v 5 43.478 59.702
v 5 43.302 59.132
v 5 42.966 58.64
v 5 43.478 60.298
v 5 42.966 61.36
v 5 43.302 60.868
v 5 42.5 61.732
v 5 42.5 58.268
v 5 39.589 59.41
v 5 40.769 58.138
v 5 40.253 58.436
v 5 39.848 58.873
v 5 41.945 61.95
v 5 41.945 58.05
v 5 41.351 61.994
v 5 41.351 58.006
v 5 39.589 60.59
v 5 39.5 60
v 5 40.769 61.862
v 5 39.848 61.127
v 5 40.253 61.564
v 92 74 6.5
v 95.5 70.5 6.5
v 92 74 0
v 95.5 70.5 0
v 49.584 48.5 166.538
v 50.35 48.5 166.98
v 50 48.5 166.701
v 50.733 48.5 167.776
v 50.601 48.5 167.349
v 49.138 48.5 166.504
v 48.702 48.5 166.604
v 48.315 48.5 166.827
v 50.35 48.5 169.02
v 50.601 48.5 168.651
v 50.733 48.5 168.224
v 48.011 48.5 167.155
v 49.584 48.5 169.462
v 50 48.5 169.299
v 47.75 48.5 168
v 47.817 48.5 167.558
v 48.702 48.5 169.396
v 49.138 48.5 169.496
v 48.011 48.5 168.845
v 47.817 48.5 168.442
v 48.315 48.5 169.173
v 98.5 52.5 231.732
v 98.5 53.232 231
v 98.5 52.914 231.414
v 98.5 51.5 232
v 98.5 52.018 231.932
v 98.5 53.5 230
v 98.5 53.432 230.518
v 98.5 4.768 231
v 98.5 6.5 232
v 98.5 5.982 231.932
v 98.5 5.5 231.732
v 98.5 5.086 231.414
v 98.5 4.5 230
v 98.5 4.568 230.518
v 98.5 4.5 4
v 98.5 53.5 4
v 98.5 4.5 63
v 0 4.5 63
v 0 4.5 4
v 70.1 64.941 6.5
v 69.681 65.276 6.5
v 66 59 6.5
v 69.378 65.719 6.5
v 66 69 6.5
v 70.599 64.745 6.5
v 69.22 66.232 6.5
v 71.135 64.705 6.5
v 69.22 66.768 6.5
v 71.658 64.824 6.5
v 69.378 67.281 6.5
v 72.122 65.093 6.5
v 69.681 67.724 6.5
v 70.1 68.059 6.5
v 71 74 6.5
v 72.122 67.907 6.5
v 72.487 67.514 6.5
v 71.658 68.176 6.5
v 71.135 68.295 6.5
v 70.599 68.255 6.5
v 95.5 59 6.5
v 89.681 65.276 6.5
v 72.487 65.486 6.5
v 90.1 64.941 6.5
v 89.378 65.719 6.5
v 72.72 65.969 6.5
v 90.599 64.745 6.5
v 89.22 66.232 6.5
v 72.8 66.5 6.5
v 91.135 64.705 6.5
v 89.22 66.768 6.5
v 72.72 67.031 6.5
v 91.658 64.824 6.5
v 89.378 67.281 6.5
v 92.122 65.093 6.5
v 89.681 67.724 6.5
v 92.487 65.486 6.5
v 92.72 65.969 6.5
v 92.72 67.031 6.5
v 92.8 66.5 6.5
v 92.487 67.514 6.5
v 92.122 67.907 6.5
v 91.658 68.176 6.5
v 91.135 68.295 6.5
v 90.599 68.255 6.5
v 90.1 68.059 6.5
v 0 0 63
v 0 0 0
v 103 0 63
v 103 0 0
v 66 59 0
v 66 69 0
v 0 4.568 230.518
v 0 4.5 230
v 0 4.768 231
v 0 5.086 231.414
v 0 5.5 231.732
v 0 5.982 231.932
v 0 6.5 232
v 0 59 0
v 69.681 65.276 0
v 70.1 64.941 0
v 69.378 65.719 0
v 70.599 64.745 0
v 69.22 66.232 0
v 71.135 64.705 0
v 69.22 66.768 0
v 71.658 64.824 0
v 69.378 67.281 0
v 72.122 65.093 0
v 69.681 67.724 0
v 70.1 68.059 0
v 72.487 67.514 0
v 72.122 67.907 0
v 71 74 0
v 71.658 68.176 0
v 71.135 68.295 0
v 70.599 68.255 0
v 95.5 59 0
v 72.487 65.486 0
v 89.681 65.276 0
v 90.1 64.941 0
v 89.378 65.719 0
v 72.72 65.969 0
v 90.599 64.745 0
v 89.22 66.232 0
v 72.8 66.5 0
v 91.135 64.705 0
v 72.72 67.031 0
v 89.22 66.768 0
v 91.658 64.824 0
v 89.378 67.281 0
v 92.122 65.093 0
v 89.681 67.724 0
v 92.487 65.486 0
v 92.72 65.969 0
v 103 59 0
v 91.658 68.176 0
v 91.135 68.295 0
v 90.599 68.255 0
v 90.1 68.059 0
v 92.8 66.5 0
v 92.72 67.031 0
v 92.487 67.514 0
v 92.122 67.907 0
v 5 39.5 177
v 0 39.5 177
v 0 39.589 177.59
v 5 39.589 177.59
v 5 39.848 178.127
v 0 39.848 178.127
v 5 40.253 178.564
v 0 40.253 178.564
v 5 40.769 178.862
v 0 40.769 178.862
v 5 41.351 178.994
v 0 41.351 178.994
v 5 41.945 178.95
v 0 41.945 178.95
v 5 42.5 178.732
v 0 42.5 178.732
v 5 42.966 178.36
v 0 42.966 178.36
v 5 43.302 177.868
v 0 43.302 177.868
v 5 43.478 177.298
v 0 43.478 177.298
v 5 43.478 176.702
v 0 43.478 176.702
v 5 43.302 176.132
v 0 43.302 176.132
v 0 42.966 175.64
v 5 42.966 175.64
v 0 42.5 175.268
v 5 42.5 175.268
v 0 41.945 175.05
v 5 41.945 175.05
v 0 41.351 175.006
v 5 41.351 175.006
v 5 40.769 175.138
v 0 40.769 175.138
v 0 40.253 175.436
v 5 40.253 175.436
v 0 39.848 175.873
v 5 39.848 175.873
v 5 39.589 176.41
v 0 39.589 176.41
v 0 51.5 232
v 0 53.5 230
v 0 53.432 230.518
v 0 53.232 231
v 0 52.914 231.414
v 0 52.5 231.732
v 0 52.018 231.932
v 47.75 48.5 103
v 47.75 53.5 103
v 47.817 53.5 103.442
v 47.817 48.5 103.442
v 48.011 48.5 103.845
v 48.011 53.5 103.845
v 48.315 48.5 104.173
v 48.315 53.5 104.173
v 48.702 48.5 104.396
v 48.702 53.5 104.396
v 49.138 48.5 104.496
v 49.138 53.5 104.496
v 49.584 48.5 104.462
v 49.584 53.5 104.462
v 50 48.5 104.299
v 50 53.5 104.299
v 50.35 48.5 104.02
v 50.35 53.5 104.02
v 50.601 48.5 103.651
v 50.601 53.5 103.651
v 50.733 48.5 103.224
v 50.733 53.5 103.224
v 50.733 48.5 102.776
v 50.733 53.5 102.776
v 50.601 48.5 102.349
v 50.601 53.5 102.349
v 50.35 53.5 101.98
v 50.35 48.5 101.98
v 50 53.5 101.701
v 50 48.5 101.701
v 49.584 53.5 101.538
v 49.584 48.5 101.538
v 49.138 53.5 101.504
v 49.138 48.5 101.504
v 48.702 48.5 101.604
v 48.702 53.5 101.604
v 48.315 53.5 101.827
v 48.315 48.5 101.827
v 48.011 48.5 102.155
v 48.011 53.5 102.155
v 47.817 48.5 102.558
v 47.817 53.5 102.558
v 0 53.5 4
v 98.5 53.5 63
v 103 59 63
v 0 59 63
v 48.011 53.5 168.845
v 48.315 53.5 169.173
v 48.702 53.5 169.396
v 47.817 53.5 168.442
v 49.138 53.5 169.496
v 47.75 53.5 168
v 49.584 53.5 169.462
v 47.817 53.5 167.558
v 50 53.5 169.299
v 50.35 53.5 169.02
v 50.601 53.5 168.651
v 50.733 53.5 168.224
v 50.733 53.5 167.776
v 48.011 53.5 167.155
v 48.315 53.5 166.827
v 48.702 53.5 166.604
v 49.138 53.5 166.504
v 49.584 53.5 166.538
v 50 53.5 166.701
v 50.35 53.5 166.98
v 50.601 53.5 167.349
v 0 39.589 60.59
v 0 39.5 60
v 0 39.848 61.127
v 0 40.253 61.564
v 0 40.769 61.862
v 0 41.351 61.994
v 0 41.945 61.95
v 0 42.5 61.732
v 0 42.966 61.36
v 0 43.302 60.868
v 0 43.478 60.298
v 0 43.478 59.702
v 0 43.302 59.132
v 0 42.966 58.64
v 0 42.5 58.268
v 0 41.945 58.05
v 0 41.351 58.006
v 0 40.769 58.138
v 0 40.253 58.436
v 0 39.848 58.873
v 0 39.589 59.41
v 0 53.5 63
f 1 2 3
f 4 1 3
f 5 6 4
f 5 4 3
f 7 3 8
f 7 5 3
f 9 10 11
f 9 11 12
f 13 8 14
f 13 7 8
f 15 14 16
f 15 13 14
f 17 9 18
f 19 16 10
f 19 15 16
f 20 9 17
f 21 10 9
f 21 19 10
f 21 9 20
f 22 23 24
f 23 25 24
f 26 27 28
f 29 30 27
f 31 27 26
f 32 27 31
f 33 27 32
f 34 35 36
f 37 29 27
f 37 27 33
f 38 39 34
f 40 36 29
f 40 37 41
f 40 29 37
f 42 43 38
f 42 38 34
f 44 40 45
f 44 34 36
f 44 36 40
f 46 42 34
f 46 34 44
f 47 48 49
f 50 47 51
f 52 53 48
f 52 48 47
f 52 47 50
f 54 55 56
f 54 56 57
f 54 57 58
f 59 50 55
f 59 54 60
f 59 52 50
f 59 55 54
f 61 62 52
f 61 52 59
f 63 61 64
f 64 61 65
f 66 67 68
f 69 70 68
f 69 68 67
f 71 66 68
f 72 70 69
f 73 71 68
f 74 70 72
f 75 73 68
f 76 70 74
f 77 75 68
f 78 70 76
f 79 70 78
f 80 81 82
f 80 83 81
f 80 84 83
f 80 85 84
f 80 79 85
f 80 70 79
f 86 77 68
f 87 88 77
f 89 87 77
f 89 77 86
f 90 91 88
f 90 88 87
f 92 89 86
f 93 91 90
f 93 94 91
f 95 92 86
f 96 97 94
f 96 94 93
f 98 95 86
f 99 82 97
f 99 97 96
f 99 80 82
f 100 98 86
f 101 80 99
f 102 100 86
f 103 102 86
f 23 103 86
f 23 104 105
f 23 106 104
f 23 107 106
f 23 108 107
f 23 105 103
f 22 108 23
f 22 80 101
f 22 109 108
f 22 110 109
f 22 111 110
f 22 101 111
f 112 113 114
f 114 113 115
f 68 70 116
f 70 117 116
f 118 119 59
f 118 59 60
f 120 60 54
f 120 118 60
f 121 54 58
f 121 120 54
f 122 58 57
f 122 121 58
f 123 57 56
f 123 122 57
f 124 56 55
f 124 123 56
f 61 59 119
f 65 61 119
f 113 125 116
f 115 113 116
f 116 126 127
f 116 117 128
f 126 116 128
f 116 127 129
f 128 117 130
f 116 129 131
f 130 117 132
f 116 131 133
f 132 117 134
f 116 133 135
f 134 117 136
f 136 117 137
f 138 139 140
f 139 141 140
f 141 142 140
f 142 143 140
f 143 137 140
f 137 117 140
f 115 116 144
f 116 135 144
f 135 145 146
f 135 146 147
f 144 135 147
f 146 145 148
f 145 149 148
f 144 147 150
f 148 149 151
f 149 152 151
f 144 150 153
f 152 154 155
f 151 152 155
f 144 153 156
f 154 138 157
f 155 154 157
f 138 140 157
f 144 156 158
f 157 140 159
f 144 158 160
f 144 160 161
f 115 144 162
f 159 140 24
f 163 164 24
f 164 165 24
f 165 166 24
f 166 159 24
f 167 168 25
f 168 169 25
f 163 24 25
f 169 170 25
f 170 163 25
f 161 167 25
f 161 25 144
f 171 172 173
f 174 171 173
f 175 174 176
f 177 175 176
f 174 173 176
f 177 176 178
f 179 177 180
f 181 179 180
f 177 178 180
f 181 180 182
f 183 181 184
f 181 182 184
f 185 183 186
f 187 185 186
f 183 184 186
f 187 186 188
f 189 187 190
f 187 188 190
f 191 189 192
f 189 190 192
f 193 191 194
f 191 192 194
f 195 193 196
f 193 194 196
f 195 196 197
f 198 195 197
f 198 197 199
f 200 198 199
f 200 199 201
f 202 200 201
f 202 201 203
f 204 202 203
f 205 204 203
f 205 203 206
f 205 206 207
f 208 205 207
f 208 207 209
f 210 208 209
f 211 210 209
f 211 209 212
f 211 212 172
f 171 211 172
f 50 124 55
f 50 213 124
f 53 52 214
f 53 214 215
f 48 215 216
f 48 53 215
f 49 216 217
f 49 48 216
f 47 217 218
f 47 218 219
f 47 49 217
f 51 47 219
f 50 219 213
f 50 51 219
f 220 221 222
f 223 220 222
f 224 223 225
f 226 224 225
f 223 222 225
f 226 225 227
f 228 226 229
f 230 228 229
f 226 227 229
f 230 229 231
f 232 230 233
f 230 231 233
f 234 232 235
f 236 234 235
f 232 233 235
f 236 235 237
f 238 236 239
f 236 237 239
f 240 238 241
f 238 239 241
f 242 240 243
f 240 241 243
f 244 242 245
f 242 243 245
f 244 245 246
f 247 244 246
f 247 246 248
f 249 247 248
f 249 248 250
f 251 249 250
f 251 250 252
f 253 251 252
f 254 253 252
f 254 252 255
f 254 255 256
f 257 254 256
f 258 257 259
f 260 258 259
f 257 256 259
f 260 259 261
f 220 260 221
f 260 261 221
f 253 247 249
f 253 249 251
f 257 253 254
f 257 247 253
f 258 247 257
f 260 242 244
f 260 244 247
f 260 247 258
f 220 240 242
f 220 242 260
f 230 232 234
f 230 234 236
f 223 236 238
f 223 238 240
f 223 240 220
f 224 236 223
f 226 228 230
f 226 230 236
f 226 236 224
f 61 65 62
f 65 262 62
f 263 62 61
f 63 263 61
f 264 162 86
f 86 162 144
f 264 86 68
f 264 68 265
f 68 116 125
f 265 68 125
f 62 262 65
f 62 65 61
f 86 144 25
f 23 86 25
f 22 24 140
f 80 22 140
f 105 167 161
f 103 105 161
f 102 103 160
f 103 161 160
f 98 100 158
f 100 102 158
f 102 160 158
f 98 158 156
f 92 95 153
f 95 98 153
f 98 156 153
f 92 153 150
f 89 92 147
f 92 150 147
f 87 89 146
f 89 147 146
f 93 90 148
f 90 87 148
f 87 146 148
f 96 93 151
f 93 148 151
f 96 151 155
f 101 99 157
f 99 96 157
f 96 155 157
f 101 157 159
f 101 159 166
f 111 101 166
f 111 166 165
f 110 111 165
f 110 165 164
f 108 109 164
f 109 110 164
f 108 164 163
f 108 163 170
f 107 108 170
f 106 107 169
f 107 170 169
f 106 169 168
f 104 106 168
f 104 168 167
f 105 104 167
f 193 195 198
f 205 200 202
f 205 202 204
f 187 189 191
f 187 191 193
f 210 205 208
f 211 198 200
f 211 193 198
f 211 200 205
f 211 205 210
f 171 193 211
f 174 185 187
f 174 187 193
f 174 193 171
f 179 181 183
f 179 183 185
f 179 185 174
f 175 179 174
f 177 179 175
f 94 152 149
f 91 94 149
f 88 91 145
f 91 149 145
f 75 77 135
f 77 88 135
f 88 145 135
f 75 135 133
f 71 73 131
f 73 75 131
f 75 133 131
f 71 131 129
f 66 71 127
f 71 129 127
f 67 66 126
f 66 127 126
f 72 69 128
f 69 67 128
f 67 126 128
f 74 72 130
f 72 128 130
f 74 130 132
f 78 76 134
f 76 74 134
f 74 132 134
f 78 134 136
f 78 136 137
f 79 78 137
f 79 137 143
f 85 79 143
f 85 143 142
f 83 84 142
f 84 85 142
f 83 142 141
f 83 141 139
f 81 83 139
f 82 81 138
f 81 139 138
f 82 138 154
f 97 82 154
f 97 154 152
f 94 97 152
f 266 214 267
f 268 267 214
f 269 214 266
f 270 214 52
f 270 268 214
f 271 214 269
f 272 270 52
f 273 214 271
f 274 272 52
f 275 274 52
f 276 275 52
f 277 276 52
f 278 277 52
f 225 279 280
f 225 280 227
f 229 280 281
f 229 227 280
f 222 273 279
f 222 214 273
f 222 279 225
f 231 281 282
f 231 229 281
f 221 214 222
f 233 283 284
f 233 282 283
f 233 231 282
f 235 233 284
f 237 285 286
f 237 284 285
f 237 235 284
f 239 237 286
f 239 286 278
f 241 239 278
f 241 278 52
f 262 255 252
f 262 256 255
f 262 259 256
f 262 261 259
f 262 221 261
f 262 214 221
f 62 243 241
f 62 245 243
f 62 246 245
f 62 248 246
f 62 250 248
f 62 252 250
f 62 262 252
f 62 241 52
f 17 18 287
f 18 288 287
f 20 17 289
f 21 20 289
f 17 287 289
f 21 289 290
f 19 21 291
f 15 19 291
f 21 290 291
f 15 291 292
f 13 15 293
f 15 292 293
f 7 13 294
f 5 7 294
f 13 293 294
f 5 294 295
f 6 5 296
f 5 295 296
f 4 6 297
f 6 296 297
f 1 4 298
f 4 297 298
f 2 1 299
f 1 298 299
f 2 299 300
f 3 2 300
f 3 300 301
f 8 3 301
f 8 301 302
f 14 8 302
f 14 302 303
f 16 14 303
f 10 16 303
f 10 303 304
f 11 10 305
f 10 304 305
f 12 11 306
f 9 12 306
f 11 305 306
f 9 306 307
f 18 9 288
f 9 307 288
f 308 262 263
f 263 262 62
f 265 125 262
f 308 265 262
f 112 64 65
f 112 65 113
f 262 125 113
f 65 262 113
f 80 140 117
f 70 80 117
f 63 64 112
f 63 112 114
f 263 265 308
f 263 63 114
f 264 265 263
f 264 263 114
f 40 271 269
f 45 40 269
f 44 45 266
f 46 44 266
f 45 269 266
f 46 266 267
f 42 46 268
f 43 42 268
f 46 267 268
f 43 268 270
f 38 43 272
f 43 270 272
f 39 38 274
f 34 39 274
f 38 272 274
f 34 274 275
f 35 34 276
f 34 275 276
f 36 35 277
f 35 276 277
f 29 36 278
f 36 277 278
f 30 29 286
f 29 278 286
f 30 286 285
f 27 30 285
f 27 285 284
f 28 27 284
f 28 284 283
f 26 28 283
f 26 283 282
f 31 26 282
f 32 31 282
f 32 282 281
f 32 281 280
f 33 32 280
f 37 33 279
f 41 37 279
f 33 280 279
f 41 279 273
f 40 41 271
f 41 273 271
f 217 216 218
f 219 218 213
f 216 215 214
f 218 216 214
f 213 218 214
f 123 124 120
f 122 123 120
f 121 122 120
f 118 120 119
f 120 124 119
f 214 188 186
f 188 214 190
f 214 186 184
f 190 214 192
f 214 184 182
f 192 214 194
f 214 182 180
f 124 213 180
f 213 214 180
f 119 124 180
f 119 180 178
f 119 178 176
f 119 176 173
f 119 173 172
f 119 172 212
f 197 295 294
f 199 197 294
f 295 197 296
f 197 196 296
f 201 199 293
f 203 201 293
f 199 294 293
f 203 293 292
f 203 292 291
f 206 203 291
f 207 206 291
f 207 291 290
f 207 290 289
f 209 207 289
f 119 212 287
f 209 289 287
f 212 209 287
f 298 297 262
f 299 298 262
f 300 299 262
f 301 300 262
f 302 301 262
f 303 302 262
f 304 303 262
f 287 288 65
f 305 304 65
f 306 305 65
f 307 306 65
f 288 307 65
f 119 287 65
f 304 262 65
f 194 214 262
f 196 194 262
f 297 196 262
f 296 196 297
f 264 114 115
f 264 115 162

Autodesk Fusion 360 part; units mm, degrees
sketch "base" plane through (0, 0, 0) normal (0, 0, 1) x (1, 0, 0)
  line L0 (0, 0) -> (103, 0)
  line L1 (103, 0) -> (103, 59)
  line L2 (103, 59) -> (0, 59)
  line L3 (0, 59) -> (0, 0)
  line L4 (0, 53.5) -> (98.5, 53.5)
  line L5 (98.5, 53.5) -> (98.5, 4.5)
  line L6 (98.5, 4.5) -> (0, 4.5)
  line L7 (95.5, 59) -> (95.5, 70.5)
  line L8 (95.5, 70.5) -> (92, 74)
  line L9 (92, 74) -> (71, 74)
  line L10 (71, 74) -> (66, 69)
  line L11 (66, 69) -> (66, 59)
  circle A0 centre (91, 66.5) radius 1.8
  circle A1 centre (71, 66.5) radius 1.8
  line L12 (71, 66.5) -> (91, 66.5) construction
  dimension "d1" = 103
  dimension "d2" = 59
  dimension "d3" = 4.5
  dimension "d4" = 5.5
  dimension "d5" = 4.5
  dimension "d6" = 12
  dimension "d7" = 7.5
  dimension "d8" = 20
  dimension "d9" = 15
  dimension "d10" = 5
  dimension "d11" = 135
  dimension "d12" = 3.6
  dimension "d13" = 3.6
  dimension "d14" = 7.5
  dimension "d15" = 5
  dimension "d16" = 3.5
  dimension "d40" = 52
extrude "Extrude1" add sketch "base" along normal blind 63 contours L0 L1 L2 L3 L4 L5 L6 makes body 1
extrude "Extrude2" add sketch "base" along normal blind 4 contours L3 L4 L5 L6 bodies 1
extrude "Extrude3" add sketch "base" along normal blind 6.5 contours L2 L7 L8 L9 L10 L11 bodies 1
extrude "Extrude4" add 1 faces at (65.6667, 37.1667, 4) along direction (0, 0, 1) up to surface (228 mm away) separate body on bodies 1 makes body 2
sketch "mounting_holes" plane through (0, 53.5, 0) normal (0, 1, 0) x (-1, 0, 0)
  line L0 (0, 232) -> (-98.5, 232)
  line L1 (-98.5, 232) -> (-98.5, 4)
  line L2 (-98.5, 4) -> (0, 4)
  line L3 (0, 4) -> (0, 232)
  circle A0 centre (-49.25, 168) radius 1.5
  circle A1 centre (-49.25, 103) radius 1.5
  line L4 (-98.5, 4) -> (-98.5, 232)
  line L5 (0, 232) -> (-98.5, 232)
  line L6 (0, 4) -> (0, 232)
  line L7 (0, 168) -> (-98.5, 168) construction
  line L8 (0, 103) -> (-98.5, 103) construction
  dimension "d28" = 3
  dimension "d29" = 3
  dimension "d31" = 64
  dimension "d32" = 65
extrude "Extrude5" cut sketch "mounting_holes" against normal blind 5 contours A0 | A1 bodies 2
sketch "frame_ mounting_holes" plane through (0, 0, 0) normal (-1, 0, 0) x (0, -1, 0)
  line L0 (-4.5, 232) -> (-53.5, 232)
  line L1 (-53.5, 232) -> (-53.5, 4)
  line L2 (-53.5, 4) -> (-4.5, 4)
  line L3 (-4.5, 4) -> (-4.5, 232)
  line L4 (-53.5, 4) -> (-53.5, 232)
  line L5 (-4.5, 232) -> (-53.5, 232)
  circle A0 centre (-41.5, 177) radius 2
  circle A1 centre (-41.5, 60) radius 2
  line L6 (-41.5, 60) -> (-41.5, 177) construction
  dimension "d35" = 4
  dimension "d36" = 4
  dimension "d37" = 12
  dimension "d38" = 55
  dimension "d39" = 117
extrude "Extrude6" cut sketch "frame_ mounting_holes" against normal blind 5 contours A0 | A1 bodies 2
fillet "Fillet1" radius 2 2 edges at (49.25, 53.5, 232) (49.25, 4.5, 232) on bodies 2
equation "d35 = d36"
